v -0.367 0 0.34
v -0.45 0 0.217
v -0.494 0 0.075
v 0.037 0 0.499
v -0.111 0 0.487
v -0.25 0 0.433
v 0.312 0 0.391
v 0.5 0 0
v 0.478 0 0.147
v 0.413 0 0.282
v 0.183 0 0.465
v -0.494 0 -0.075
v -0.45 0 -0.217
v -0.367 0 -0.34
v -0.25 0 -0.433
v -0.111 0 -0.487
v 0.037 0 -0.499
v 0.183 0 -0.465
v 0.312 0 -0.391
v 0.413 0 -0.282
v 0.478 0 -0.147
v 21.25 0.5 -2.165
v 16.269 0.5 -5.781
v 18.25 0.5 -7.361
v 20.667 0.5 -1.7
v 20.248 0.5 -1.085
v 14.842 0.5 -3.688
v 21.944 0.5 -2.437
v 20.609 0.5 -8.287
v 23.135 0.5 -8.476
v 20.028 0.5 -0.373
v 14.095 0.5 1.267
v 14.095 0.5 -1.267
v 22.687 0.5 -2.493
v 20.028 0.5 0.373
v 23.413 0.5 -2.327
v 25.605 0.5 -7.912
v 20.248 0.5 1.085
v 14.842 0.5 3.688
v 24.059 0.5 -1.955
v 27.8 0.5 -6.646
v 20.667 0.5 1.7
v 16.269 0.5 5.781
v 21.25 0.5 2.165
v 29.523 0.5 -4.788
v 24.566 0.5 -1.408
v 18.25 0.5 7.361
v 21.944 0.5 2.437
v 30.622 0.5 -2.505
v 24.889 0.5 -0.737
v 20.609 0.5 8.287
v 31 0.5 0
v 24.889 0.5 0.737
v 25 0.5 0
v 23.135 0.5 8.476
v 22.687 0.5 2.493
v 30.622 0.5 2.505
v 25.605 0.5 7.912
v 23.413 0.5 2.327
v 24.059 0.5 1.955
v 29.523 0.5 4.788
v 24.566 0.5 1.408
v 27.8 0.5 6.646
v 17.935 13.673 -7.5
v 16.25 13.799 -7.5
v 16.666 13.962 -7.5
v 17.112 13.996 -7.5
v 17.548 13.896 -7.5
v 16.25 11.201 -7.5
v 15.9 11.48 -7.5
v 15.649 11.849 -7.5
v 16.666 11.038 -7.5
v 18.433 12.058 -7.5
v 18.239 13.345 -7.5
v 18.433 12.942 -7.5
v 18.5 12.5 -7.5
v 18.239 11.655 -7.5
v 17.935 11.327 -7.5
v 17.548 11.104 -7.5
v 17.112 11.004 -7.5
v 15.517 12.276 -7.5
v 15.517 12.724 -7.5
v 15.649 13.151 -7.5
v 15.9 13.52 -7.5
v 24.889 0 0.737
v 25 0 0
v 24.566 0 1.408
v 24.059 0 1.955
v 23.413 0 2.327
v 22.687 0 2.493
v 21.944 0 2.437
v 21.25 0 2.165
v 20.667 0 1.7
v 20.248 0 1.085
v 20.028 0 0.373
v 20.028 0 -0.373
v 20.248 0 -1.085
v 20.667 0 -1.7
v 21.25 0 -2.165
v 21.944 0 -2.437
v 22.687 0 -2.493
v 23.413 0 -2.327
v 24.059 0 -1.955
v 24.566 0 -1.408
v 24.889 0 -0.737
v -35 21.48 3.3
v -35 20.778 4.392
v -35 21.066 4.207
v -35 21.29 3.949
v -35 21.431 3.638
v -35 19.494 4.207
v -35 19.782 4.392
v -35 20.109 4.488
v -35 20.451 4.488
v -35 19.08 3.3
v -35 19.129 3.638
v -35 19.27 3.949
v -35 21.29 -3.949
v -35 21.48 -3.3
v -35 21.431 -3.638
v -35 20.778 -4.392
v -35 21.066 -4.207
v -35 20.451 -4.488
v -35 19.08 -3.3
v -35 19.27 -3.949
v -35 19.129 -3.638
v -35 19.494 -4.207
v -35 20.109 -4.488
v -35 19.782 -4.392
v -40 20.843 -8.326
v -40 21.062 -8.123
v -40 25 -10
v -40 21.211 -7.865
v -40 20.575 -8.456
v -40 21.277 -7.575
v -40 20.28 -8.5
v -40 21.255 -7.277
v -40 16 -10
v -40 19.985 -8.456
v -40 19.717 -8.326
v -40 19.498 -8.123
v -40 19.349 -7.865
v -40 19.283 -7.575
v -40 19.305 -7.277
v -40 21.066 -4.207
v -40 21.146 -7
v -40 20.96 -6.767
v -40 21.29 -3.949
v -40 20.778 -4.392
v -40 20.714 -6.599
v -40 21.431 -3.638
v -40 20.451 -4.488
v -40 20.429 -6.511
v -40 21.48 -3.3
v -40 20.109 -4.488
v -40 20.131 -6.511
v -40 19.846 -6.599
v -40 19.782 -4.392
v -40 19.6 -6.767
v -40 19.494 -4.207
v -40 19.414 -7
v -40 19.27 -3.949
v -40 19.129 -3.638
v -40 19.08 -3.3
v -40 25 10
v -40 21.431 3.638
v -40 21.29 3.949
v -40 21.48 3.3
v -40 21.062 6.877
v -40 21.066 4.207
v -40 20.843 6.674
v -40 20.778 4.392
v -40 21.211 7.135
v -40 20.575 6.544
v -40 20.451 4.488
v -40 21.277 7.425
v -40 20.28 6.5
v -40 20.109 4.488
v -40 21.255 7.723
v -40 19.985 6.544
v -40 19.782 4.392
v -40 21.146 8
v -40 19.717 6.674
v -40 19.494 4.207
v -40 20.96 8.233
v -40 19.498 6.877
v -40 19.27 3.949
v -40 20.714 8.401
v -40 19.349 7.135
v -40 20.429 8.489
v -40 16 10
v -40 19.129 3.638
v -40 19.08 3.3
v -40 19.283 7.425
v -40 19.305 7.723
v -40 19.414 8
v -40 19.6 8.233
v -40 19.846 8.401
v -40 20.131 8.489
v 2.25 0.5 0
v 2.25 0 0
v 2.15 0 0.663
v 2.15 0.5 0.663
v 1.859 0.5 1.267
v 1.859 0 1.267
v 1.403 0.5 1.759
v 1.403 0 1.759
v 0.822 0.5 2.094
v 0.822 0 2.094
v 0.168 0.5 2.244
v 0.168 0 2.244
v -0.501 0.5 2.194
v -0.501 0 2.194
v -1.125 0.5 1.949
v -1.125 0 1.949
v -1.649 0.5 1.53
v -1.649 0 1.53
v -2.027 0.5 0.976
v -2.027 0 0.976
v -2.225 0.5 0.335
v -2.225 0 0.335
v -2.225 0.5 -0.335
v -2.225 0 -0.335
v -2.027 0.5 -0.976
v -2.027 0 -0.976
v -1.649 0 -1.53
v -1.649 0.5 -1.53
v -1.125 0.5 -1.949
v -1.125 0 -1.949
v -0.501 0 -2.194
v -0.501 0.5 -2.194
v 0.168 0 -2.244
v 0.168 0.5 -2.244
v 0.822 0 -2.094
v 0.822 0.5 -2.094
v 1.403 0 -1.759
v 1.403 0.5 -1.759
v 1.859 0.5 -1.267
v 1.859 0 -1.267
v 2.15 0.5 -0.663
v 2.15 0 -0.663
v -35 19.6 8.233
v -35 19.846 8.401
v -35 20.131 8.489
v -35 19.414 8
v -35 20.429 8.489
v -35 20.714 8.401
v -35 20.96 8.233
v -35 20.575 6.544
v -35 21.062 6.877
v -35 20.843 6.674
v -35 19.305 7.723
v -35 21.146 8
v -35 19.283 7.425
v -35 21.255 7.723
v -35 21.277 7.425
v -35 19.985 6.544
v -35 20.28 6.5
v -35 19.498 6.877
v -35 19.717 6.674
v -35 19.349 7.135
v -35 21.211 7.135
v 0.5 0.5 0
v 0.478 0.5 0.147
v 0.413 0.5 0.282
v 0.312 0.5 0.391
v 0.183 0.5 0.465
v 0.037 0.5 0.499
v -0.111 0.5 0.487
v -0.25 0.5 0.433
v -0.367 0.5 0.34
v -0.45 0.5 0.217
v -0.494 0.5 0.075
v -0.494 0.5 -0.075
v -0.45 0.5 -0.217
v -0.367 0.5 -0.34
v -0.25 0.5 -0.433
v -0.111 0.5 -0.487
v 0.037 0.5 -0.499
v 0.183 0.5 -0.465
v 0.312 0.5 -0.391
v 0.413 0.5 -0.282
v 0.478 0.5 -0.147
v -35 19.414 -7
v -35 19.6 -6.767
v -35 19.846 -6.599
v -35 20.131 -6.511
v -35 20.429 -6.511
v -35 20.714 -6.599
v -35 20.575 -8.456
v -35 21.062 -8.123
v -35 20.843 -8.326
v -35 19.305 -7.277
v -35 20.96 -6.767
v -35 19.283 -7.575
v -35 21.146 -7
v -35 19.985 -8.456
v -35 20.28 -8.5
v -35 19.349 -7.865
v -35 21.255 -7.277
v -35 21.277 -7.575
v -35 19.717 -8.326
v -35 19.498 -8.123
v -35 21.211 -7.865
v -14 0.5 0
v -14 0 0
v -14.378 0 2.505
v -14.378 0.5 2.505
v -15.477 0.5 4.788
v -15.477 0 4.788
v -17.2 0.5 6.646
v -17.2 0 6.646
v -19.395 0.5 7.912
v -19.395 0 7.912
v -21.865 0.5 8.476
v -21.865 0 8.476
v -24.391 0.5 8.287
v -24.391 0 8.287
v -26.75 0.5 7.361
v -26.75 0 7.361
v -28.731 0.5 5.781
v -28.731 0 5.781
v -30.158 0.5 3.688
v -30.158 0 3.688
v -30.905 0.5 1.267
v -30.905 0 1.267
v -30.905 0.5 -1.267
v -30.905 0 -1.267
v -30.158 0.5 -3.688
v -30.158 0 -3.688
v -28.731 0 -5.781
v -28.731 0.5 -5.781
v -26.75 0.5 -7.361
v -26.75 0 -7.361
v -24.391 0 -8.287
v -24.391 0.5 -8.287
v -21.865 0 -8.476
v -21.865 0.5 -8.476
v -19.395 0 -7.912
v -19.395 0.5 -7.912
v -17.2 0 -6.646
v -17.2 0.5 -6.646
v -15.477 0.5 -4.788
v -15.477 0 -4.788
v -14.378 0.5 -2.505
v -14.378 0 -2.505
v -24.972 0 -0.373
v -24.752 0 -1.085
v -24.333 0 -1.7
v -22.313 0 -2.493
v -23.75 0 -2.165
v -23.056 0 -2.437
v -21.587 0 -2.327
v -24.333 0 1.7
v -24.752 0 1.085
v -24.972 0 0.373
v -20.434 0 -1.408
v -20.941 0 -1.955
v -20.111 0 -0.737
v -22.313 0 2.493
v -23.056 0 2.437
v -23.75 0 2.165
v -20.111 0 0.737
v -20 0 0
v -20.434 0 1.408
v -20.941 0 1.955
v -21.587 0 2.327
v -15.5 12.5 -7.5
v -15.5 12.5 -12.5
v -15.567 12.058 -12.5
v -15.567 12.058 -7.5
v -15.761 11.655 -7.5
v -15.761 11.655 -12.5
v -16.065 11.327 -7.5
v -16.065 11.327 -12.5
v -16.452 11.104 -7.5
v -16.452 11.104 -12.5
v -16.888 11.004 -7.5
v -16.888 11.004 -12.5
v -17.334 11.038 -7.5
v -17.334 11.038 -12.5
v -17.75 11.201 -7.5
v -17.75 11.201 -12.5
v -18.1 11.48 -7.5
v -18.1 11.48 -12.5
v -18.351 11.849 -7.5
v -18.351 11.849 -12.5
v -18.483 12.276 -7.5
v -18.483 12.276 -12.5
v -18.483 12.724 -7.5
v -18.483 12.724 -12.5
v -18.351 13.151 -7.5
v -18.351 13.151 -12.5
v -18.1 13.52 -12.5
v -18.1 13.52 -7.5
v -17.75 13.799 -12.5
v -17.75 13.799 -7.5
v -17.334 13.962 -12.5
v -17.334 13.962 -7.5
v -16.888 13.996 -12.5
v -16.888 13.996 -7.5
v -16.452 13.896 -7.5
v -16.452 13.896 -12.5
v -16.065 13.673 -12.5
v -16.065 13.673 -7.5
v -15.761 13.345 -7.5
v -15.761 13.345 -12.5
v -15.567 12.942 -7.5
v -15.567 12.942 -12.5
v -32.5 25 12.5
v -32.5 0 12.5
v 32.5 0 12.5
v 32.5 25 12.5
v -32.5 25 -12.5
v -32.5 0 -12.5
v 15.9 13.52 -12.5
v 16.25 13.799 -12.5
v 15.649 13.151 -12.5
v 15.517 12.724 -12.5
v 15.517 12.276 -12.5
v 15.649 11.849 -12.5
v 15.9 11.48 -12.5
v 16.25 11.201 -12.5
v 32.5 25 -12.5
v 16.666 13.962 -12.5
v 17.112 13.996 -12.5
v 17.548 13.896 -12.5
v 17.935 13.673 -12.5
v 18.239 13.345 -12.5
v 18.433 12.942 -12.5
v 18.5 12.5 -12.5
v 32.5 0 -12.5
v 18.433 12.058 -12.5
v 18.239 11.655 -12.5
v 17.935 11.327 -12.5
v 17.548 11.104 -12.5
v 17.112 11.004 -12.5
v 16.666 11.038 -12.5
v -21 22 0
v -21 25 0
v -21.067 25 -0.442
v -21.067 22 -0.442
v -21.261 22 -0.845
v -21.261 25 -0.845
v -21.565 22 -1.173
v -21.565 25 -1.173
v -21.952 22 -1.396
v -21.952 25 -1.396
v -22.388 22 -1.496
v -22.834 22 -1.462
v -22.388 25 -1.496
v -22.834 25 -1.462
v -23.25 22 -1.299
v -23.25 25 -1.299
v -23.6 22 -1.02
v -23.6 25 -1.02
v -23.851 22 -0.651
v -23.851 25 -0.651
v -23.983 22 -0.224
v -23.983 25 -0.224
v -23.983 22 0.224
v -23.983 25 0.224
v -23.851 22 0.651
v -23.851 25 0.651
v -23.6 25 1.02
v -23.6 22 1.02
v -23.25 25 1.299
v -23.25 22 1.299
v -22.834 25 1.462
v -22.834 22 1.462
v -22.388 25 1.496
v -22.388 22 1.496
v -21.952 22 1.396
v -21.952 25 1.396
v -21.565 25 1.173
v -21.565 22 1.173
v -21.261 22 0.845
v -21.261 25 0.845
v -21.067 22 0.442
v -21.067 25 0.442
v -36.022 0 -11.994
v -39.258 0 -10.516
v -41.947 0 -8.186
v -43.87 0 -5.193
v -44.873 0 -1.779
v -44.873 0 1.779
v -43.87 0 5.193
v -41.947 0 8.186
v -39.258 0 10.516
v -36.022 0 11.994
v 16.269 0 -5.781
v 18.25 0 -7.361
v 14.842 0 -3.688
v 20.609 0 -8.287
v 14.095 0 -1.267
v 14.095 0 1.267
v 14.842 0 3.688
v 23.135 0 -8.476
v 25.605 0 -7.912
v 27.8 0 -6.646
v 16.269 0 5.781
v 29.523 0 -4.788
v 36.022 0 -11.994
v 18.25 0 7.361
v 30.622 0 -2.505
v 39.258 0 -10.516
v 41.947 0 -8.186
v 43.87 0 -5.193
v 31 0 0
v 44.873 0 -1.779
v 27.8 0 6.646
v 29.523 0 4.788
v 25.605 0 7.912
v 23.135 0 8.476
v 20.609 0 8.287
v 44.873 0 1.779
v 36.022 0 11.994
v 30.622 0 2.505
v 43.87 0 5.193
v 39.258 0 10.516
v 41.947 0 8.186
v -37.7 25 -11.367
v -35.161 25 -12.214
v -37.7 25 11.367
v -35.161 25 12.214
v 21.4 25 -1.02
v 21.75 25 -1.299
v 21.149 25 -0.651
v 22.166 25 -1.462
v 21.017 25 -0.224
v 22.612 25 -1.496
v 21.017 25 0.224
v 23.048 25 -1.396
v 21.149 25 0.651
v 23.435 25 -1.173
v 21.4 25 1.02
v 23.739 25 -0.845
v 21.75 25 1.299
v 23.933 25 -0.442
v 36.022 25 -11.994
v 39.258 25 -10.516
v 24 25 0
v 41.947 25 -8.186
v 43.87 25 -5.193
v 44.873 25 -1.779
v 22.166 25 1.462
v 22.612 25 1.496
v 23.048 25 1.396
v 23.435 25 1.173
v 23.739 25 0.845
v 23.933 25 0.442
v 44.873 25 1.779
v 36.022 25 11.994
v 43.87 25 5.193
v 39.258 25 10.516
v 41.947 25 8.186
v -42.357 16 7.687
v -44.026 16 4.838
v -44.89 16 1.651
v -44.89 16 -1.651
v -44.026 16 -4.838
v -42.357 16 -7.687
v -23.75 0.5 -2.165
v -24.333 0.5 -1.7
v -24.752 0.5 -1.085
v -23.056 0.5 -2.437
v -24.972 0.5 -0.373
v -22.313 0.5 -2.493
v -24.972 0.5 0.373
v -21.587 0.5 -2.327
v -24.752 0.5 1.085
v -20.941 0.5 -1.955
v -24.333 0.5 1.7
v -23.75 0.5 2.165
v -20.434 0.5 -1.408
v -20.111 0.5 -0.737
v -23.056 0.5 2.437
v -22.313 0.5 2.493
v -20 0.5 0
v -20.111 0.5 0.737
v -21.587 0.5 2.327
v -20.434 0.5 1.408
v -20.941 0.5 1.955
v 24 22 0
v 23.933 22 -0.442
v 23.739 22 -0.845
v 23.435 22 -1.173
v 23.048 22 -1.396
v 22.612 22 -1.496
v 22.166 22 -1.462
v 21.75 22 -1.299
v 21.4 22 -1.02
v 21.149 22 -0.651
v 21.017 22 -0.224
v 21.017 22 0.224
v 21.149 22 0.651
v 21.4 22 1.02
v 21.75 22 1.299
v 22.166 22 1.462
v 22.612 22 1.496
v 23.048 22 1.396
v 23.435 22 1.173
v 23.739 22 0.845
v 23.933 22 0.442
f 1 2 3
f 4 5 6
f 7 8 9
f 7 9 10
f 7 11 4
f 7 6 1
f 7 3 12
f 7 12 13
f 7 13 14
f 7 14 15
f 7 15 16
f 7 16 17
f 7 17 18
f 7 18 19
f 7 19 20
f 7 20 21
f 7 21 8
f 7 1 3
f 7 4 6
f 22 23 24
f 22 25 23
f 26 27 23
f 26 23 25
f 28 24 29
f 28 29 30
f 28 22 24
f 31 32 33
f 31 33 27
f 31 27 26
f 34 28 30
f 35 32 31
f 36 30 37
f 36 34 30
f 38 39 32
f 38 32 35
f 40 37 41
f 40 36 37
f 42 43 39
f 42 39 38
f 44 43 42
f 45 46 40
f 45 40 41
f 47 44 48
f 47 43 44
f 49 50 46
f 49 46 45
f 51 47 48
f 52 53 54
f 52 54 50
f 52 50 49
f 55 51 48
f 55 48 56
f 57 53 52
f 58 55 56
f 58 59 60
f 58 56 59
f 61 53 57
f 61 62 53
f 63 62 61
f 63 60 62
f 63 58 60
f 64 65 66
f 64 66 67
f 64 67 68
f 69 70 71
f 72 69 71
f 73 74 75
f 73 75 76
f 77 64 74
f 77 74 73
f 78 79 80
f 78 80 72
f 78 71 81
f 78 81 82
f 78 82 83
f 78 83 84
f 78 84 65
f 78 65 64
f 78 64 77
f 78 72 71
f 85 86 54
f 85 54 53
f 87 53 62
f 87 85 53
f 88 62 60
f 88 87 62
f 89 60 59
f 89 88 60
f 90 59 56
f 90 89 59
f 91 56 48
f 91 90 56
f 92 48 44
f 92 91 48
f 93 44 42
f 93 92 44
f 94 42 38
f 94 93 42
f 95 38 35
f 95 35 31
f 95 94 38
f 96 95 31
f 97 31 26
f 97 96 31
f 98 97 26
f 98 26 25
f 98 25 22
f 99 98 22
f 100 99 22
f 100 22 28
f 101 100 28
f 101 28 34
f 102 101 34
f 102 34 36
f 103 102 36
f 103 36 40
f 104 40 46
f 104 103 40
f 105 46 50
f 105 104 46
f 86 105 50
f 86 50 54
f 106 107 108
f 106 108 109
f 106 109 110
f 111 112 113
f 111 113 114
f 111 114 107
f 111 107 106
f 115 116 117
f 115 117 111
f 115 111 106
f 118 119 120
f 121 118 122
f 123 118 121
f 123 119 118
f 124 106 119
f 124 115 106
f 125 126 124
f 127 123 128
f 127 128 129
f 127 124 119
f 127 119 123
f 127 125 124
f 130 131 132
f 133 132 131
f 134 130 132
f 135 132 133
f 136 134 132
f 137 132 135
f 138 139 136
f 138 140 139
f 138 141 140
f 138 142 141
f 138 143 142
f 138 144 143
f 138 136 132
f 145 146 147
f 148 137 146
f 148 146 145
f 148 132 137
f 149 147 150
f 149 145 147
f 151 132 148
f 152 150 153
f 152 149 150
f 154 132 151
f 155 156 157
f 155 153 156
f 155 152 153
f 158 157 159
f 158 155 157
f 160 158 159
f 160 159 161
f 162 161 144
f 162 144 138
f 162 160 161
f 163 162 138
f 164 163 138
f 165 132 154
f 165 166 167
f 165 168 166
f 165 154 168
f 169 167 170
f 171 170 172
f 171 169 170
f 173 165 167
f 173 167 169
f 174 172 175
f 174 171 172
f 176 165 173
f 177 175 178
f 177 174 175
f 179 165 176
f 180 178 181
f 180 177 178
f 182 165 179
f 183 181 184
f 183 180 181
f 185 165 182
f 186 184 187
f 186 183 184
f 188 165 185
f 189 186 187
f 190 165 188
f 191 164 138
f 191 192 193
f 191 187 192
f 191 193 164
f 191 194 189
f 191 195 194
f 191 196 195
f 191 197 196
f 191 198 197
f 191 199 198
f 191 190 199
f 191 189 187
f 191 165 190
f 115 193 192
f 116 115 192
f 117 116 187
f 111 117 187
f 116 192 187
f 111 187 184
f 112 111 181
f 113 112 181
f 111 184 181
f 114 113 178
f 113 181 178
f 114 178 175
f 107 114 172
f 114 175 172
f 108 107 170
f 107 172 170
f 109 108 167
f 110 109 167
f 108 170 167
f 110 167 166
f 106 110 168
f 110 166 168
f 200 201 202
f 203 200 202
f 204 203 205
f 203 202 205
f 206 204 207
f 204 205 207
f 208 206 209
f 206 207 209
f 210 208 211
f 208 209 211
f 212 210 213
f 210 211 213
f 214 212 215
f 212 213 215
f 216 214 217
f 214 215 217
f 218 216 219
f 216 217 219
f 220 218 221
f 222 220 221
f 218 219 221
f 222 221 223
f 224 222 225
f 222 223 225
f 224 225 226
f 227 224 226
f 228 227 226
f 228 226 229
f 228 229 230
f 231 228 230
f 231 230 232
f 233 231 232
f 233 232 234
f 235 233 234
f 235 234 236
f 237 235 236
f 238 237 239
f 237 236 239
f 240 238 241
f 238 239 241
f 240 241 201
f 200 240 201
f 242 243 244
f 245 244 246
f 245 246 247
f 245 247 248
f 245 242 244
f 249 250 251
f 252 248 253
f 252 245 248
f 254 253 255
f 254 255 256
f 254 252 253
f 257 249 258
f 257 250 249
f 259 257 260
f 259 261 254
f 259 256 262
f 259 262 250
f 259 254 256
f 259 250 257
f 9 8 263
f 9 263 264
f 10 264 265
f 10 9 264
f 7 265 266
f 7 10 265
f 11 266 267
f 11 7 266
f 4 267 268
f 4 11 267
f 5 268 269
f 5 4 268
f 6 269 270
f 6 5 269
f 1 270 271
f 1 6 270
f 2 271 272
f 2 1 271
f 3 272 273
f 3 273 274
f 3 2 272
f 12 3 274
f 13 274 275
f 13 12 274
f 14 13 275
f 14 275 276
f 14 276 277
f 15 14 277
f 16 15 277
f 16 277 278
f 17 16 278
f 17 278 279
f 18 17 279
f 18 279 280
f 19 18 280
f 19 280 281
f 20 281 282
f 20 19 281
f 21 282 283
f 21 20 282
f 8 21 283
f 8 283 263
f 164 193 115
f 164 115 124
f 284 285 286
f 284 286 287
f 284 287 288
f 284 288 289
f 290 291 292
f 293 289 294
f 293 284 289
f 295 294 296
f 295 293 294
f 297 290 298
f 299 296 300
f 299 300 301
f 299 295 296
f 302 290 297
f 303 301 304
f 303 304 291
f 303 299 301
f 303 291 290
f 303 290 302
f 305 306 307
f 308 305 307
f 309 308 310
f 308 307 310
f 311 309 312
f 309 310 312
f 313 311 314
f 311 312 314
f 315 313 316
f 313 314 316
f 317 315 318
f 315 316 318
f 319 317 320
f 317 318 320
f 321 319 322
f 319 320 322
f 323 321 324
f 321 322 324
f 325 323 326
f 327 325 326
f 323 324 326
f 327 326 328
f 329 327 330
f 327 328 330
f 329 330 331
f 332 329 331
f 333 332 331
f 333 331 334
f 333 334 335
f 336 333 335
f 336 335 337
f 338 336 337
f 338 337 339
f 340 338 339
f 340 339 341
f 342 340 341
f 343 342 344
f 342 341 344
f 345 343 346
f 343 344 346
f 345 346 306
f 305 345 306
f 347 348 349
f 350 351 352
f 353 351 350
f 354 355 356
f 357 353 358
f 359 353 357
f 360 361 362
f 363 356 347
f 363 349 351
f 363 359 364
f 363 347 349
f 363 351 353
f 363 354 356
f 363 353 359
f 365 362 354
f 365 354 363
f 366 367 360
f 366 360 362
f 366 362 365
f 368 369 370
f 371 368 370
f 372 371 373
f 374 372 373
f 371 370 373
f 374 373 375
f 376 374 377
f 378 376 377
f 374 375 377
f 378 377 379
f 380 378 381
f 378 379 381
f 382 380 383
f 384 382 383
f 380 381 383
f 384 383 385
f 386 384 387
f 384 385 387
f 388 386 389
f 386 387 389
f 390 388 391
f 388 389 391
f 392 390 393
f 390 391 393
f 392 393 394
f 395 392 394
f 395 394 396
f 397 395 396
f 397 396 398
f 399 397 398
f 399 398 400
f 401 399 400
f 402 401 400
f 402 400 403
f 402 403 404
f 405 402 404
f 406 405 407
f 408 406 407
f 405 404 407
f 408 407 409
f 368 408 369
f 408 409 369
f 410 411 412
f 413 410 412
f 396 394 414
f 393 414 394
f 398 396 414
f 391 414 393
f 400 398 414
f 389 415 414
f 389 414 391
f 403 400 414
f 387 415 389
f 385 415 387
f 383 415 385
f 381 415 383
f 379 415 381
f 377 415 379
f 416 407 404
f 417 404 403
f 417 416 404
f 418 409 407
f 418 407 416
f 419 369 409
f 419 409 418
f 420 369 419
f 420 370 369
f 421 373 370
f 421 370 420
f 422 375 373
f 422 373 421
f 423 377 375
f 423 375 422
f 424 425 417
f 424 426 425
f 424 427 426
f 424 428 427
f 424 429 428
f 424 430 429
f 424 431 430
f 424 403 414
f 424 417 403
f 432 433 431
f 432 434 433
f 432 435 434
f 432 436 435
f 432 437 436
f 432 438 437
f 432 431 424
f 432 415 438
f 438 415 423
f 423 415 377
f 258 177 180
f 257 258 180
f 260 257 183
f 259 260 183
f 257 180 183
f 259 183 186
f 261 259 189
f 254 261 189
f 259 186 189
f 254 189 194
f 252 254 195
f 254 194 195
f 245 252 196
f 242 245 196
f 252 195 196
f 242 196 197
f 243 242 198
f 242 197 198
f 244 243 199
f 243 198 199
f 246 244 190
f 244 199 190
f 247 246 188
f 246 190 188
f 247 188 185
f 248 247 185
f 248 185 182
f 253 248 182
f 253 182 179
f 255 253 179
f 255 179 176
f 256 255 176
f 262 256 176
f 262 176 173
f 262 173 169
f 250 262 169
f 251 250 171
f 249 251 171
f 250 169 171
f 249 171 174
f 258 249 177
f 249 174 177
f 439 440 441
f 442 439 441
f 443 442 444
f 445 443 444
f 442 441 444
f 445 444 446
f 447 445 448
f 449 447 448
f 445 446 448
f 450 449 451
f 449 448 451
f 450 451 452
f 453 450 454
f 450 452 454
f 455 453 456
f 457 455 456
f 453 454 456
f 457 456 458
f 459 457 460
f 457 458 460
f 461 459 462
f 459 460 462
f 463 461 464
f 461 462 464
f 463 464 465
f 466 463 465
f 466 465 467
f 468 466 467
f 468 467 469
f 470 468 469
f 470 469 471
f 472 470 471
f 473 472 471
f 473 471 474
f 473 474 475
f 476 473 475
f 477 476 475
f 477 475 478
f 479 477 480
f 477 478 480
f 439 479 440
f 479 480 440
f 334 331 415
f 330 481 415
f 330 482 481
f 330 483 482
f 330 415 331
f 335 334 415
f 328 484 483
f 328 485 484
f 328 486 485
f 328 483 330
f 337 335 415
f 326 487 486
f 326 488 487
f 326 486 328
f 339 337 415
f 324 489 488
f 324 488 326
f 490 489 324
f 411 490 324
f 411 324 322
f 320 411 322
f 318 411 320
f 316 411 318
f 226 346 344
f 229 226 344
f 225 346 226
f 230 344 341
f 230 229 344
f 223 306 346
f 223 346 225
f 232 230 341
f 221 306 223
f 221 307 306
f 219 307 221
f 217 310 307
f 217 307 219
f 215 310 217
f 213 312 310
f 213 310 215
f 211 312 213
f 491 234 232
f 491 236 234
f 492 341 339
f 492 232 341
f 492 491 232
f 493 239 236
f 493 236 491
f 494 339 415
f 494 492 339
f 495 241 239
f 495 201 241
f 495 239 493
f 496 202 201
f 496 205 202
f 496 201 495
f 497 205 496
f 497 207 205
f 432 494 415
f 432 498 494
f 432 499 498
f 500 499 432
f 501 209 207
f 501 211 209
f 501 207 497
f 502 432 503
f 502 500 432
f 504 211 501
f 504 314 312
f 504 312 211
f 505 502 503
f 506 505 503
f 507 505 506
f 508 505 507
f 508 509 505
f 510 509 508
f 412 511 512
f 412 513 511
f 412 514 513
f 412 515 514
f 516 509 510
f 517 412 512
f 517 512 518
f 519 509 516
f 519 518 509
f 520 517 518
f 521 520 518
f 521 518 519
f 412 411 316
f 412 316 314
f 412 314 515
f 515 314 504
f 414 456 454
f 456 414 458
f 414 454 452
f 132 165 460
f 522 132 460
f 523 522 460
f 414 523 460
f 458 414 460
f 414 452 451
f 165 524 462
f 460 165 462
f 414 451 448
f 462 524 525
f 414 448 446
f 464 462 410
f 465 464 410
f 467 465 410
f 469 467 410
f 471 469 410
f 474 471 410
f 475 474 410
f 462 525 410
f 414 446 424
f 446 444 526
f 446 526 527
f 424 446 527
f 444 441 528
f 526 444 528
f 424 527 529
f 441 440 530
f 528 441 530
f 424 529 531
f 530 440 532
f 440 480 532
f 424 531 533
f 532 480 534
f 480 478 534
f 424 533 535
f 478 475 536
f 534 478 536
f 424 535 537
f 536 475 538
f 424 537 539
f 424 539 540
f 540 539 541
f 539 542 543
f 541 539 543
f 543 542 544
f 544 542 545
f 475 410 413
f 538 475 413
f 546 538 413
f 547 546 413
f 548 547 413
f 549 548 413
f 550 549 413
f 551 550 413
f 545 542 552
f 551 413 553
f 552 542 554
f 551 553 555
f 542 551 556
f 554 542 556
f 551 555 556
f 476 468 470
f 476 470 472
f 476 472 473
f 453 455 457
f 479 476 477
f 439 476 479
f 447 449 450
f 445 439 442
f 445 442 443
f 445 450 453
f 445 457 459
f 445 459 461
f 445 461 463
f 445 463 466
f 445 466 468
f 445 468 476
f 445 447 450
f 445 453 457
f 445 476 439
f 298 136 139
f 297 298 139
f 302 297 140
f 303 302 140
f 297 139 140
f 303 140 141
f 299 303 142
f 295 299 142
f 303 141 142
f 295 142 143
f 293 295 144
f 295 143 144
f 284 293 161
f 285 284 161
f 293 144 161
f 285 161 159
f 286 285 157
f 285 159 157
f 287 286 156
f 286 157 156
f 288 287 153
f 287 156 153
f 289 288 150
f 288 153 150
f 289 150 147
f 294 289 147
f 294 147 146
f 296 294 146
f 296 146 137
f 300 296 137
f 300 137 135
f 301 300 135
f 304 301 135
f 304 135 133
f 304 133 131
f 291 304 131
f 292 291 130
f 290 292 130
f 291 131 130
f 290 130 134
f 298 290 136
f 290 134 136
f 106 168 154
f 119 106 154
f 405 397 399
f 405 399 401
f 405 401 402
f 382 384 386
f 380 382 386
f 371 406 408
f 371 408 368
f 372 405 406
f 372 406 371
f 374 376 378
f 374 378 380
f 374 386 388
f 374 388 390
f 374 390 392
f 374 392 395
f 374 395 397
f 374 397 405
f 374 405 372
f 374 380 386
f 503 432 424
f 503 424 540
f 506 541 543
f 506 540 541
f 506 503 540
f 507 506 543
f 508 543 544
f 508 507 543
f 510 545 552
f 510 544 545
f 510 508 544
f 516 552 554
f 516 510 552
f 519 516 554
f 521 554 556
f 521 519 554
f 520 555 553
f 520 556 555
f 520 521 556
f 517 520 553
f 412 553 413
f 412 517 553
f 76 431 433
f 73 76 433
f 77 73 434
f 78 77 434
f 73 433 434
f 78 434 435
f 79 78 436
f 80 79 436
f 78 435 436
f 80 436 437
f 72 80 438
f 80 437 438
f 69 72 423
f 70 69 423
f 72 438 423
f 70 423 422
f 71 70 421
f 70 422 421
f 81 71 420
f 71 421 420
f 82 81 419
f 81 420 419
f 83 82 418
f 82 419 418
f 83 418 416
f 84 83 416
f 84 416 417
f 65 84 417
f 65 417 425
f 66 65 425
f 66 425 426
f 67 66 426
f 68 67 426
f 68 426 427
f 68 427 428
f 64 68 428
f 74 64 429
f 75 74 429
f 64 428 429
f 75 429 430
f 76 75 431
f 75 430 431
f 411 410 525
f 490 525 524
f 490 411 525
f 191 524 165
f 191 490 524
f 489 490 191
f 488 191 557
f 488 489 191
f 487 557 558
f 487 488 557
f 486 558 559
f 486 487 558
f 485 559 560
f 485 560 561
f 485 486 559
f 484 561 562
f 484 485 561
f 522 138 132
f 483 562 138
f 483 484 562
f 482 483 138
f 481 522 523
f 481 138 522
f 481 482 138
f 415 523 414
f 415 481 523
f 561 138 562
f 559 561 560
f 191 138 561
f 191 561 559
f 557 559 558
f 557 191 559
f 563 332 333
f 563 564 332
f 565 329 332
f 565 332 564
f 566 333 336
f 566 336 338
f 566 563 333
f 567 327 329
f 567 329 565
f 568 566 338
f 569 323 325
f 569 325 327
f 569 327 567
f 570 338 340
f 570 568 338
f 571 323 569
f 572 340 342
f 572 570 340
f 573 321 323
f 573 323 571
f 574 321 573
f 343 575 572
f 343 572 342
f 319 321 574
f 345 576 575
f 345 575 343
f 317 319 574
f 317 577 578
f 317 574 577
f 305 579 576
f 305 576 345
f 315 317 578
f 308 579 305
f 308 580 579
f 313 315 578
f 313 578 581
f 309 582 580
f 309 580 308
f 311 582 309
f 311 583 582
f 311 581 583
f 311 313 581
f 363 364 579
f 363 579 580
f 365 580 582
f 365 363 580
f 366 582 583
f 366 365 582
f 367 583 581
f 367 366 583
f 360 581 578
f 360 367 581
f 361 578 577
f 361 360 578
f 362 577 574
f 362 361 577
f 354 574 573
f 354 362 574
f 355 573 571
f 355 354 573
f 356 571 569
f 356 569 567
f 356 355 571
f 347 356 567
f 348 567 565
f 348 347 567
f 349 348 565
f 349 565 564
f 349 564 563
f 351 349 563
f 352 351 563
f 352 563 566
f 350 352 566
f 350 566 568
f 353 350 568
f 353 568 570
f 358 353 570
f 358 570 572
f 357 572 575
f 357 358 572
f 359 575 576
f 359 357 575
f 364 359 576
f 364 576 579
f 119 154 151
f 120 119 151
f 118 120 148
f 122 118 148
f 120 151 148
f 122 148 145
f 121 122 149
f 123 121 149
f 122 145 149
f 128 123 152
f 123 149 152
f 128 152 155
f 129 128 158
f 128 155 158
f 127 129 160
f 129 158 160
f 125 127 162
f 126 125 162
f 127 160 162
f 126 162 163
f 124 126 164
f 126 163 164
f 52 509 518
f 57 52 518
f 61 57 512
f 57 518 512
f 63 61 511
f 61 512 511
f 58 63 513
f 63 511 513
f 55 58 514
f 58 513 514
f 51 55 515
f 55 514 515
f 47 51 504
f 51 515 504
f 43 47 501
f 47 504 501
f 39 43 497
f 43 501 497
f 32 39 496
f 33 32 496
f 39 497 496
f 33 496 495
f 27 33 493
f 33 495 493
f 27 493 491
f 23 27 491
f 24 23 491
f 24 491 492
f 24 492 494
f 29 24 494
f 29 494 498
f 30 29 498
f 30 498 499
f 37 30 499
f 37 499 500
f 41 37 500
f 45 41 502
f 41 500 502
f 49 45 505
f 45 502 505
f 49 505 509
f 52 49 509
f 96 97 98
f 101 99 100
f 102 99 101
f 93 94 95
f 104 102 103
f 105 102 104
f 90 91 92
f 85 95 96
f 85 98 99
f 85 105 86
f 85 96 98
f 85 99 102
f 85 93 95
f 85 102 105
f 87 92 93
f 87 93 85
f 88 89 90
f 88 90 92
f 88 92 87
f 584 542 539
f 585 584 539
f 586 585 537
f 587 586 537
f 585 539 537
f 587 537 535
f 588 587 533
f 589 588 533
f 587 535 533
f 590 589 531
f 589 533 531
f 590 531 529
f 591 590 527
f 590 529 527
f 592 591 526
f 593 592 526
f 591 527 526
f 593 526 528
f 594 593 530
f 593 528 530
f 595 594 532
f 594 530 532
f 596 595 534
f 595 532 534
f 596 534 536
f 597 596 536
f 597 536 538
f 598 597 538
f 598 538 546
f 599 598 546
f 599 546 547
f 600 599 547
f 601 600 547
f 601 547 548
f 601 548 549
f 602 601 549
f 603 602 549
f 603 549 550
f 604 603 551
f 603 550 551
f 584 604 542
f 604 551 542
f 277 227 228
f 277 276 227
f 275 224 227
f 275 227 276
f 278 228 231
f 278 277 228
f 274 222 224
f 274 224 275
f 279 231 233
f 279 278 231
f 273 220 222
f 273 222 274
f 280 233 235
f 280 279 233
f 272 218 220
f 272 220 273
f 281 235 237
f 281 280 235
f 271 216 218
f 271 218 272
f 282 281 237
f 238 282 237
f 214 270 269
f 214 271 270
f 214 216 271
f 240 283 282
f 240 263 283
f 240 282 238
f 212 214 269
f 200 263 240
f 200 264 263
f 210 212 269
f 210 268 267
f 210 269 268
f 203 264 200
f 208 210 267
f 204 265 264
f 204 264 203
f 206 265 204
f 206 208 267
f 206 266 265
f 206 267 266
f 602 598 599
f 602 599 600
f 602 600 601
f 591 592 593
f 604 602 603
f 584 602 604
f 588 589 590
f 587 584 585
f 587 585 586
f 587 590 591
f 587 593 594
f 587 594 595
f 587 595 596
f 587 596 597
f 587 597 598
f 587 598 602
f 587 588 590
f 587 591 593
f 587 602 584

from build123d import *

# Parameters (mm, degrees)
PAD_DEPTH       = 25
SKETCH001_W     = 91
SKETCH001_H     = 26
POCKET_DEPTH    = 25.001
SKETCH002_R     = 1.5
POCKET001_DEPTH = 3
SKETCH004_R     = 1
POCKET002_DEPTH = 5
SKETCH005_R     = 8.5
SKETCH005_R_2   = 2.5
SKETCH005_R_3   = 2.25
SKETCH005_R_4   = 0.5
POCKET003_DEPTH = 0.5
SKETCH006_R     = 1.5
POCKET004_DEPTH = 5


with BuildPart() as part:
    # Sketch → Pad (new body)
    with BuildSketch(Plane.XZ):
        with BuildLine():
            ThreePointArc((-32.5, 12.5), (-45, 0), (-32.5, -12.5))
            Line((-32.5, -12.5), (32.5, -12.5))
            ThreePointArc((32.5, -12.5), (45, 0), (32.5, 12.5))
            Line((-32.5, 12.5), (32.5, 12.5))
        make_face()
    extrude(amount=-PAD_DEPTH)

    # Sketch001 (on Face4 of Pad) → Pocket (cut, through all)
    with BuildSketch(Plane(origin=(0, 0, 12.5), x_dir=(-1, 0, 0), z_dir=(0, 0, 1))):
        with Locations((0, -12.5)):
            Rectangle(SKETCH001_W, SKETCH001_H)
        Polygon((45, -16), (45, -2), (45, 0), (44, 0), (-32.5, 0), (-44.5, 0), (-45, 0), (-45, -3.68), (-45, -23), (-45, -25), (-44, -25), (40, -25), (40, -16), align=None, mode=Mode.SUBTRACT)
    extrude(amount=-POCKET_DEPTH, mode=Mode.SUBTRACT)

    # Sketch002 (on Face5 of Pocket) → Pocket001 (cut)
    with BuildSketch(Plane(origin=(0, 25, 0), x_dir=(1, 0, 0), z_dir=(0, 1, 0))):
        with Locations((22.5, 0)):
            Circle(SKETCH002_R)
        with Locations((-22.5, 0)):
            Circle(SKETCH002_R)
    extrude(amount=-POCKET001_DEPTH, mode=Mode.SUBTRACT)

    # Sketch004 (on Face7 of Pocket001) → Pocket002 (cut)
    with BuildSketch(Plane(origin=(-40, 0, 0), x_dir=(0, 0, -1), z_dir=(-1, 0, 0))):
        with Locations((-7.5, -20.28)):
            Circle(SKETCH004_R)
        with Locations((7.5, -20.28)):
            Circle(SKETCH004_R)
        with BuildLine():
            ThreePointArc((-3.3, -19.08), (-4.5, -20.28), (-3.3, -21.48))
            Line((-3.3, -21.48), (3.3, -21.48))
            ThreePointArc((3.3, -21.48), (4.5, -20.28), (3.3, -19.08))
            Line((-3.3, -19.08), (3.3, -19.08))
        make_face()
    extrude(amount=-POCKET002_DEPTH, mode=Mode.SUBTRACT)

    # Sketch005 (on Face1 of Pocket002) → Pocket003 (cut)
    with BuildSketch(Plane.XZ):
        with Locations((-22.5, 0)):
            Circle(SKETCH005_R)
        with Locations((-22.5, 0)):
            Circle(SKETCH005_R_2, mode=Mode.SUBTRACT)
        with Locations((22.5, 0)):
            Circle(SKETCH005_R)
        with Locations((22.5, 0)):
            Circle(SKETCH005_R_2, mode=Mode.SUBTRACT)
        Circle(SKETCH005_R_3)
        Circle(SKETCH005_R_4, mode=Mode.SUBTRACT)
    extrude(amount=-POCKET003_DEPTH, mode=Mode.SUBTRACT)

    # Sketch006 (on Face5 of Pocket003) → Pocket004 (cut)
    with BuildSketch(Plane(origin=(0, 0, -12.5), x_dir=(1, 0, 0), z_dir=(0, 0, -1))):
        with Locations((-17, -12.5)):
            Circle(SKETCH006_R)
        with Locations((17, -12.5)):
            Circle(SKETCH006_R)
    extrude(amount=-POCKET004_DEPTH, mode=Mode.SUBTRACT)


solid = part.part
